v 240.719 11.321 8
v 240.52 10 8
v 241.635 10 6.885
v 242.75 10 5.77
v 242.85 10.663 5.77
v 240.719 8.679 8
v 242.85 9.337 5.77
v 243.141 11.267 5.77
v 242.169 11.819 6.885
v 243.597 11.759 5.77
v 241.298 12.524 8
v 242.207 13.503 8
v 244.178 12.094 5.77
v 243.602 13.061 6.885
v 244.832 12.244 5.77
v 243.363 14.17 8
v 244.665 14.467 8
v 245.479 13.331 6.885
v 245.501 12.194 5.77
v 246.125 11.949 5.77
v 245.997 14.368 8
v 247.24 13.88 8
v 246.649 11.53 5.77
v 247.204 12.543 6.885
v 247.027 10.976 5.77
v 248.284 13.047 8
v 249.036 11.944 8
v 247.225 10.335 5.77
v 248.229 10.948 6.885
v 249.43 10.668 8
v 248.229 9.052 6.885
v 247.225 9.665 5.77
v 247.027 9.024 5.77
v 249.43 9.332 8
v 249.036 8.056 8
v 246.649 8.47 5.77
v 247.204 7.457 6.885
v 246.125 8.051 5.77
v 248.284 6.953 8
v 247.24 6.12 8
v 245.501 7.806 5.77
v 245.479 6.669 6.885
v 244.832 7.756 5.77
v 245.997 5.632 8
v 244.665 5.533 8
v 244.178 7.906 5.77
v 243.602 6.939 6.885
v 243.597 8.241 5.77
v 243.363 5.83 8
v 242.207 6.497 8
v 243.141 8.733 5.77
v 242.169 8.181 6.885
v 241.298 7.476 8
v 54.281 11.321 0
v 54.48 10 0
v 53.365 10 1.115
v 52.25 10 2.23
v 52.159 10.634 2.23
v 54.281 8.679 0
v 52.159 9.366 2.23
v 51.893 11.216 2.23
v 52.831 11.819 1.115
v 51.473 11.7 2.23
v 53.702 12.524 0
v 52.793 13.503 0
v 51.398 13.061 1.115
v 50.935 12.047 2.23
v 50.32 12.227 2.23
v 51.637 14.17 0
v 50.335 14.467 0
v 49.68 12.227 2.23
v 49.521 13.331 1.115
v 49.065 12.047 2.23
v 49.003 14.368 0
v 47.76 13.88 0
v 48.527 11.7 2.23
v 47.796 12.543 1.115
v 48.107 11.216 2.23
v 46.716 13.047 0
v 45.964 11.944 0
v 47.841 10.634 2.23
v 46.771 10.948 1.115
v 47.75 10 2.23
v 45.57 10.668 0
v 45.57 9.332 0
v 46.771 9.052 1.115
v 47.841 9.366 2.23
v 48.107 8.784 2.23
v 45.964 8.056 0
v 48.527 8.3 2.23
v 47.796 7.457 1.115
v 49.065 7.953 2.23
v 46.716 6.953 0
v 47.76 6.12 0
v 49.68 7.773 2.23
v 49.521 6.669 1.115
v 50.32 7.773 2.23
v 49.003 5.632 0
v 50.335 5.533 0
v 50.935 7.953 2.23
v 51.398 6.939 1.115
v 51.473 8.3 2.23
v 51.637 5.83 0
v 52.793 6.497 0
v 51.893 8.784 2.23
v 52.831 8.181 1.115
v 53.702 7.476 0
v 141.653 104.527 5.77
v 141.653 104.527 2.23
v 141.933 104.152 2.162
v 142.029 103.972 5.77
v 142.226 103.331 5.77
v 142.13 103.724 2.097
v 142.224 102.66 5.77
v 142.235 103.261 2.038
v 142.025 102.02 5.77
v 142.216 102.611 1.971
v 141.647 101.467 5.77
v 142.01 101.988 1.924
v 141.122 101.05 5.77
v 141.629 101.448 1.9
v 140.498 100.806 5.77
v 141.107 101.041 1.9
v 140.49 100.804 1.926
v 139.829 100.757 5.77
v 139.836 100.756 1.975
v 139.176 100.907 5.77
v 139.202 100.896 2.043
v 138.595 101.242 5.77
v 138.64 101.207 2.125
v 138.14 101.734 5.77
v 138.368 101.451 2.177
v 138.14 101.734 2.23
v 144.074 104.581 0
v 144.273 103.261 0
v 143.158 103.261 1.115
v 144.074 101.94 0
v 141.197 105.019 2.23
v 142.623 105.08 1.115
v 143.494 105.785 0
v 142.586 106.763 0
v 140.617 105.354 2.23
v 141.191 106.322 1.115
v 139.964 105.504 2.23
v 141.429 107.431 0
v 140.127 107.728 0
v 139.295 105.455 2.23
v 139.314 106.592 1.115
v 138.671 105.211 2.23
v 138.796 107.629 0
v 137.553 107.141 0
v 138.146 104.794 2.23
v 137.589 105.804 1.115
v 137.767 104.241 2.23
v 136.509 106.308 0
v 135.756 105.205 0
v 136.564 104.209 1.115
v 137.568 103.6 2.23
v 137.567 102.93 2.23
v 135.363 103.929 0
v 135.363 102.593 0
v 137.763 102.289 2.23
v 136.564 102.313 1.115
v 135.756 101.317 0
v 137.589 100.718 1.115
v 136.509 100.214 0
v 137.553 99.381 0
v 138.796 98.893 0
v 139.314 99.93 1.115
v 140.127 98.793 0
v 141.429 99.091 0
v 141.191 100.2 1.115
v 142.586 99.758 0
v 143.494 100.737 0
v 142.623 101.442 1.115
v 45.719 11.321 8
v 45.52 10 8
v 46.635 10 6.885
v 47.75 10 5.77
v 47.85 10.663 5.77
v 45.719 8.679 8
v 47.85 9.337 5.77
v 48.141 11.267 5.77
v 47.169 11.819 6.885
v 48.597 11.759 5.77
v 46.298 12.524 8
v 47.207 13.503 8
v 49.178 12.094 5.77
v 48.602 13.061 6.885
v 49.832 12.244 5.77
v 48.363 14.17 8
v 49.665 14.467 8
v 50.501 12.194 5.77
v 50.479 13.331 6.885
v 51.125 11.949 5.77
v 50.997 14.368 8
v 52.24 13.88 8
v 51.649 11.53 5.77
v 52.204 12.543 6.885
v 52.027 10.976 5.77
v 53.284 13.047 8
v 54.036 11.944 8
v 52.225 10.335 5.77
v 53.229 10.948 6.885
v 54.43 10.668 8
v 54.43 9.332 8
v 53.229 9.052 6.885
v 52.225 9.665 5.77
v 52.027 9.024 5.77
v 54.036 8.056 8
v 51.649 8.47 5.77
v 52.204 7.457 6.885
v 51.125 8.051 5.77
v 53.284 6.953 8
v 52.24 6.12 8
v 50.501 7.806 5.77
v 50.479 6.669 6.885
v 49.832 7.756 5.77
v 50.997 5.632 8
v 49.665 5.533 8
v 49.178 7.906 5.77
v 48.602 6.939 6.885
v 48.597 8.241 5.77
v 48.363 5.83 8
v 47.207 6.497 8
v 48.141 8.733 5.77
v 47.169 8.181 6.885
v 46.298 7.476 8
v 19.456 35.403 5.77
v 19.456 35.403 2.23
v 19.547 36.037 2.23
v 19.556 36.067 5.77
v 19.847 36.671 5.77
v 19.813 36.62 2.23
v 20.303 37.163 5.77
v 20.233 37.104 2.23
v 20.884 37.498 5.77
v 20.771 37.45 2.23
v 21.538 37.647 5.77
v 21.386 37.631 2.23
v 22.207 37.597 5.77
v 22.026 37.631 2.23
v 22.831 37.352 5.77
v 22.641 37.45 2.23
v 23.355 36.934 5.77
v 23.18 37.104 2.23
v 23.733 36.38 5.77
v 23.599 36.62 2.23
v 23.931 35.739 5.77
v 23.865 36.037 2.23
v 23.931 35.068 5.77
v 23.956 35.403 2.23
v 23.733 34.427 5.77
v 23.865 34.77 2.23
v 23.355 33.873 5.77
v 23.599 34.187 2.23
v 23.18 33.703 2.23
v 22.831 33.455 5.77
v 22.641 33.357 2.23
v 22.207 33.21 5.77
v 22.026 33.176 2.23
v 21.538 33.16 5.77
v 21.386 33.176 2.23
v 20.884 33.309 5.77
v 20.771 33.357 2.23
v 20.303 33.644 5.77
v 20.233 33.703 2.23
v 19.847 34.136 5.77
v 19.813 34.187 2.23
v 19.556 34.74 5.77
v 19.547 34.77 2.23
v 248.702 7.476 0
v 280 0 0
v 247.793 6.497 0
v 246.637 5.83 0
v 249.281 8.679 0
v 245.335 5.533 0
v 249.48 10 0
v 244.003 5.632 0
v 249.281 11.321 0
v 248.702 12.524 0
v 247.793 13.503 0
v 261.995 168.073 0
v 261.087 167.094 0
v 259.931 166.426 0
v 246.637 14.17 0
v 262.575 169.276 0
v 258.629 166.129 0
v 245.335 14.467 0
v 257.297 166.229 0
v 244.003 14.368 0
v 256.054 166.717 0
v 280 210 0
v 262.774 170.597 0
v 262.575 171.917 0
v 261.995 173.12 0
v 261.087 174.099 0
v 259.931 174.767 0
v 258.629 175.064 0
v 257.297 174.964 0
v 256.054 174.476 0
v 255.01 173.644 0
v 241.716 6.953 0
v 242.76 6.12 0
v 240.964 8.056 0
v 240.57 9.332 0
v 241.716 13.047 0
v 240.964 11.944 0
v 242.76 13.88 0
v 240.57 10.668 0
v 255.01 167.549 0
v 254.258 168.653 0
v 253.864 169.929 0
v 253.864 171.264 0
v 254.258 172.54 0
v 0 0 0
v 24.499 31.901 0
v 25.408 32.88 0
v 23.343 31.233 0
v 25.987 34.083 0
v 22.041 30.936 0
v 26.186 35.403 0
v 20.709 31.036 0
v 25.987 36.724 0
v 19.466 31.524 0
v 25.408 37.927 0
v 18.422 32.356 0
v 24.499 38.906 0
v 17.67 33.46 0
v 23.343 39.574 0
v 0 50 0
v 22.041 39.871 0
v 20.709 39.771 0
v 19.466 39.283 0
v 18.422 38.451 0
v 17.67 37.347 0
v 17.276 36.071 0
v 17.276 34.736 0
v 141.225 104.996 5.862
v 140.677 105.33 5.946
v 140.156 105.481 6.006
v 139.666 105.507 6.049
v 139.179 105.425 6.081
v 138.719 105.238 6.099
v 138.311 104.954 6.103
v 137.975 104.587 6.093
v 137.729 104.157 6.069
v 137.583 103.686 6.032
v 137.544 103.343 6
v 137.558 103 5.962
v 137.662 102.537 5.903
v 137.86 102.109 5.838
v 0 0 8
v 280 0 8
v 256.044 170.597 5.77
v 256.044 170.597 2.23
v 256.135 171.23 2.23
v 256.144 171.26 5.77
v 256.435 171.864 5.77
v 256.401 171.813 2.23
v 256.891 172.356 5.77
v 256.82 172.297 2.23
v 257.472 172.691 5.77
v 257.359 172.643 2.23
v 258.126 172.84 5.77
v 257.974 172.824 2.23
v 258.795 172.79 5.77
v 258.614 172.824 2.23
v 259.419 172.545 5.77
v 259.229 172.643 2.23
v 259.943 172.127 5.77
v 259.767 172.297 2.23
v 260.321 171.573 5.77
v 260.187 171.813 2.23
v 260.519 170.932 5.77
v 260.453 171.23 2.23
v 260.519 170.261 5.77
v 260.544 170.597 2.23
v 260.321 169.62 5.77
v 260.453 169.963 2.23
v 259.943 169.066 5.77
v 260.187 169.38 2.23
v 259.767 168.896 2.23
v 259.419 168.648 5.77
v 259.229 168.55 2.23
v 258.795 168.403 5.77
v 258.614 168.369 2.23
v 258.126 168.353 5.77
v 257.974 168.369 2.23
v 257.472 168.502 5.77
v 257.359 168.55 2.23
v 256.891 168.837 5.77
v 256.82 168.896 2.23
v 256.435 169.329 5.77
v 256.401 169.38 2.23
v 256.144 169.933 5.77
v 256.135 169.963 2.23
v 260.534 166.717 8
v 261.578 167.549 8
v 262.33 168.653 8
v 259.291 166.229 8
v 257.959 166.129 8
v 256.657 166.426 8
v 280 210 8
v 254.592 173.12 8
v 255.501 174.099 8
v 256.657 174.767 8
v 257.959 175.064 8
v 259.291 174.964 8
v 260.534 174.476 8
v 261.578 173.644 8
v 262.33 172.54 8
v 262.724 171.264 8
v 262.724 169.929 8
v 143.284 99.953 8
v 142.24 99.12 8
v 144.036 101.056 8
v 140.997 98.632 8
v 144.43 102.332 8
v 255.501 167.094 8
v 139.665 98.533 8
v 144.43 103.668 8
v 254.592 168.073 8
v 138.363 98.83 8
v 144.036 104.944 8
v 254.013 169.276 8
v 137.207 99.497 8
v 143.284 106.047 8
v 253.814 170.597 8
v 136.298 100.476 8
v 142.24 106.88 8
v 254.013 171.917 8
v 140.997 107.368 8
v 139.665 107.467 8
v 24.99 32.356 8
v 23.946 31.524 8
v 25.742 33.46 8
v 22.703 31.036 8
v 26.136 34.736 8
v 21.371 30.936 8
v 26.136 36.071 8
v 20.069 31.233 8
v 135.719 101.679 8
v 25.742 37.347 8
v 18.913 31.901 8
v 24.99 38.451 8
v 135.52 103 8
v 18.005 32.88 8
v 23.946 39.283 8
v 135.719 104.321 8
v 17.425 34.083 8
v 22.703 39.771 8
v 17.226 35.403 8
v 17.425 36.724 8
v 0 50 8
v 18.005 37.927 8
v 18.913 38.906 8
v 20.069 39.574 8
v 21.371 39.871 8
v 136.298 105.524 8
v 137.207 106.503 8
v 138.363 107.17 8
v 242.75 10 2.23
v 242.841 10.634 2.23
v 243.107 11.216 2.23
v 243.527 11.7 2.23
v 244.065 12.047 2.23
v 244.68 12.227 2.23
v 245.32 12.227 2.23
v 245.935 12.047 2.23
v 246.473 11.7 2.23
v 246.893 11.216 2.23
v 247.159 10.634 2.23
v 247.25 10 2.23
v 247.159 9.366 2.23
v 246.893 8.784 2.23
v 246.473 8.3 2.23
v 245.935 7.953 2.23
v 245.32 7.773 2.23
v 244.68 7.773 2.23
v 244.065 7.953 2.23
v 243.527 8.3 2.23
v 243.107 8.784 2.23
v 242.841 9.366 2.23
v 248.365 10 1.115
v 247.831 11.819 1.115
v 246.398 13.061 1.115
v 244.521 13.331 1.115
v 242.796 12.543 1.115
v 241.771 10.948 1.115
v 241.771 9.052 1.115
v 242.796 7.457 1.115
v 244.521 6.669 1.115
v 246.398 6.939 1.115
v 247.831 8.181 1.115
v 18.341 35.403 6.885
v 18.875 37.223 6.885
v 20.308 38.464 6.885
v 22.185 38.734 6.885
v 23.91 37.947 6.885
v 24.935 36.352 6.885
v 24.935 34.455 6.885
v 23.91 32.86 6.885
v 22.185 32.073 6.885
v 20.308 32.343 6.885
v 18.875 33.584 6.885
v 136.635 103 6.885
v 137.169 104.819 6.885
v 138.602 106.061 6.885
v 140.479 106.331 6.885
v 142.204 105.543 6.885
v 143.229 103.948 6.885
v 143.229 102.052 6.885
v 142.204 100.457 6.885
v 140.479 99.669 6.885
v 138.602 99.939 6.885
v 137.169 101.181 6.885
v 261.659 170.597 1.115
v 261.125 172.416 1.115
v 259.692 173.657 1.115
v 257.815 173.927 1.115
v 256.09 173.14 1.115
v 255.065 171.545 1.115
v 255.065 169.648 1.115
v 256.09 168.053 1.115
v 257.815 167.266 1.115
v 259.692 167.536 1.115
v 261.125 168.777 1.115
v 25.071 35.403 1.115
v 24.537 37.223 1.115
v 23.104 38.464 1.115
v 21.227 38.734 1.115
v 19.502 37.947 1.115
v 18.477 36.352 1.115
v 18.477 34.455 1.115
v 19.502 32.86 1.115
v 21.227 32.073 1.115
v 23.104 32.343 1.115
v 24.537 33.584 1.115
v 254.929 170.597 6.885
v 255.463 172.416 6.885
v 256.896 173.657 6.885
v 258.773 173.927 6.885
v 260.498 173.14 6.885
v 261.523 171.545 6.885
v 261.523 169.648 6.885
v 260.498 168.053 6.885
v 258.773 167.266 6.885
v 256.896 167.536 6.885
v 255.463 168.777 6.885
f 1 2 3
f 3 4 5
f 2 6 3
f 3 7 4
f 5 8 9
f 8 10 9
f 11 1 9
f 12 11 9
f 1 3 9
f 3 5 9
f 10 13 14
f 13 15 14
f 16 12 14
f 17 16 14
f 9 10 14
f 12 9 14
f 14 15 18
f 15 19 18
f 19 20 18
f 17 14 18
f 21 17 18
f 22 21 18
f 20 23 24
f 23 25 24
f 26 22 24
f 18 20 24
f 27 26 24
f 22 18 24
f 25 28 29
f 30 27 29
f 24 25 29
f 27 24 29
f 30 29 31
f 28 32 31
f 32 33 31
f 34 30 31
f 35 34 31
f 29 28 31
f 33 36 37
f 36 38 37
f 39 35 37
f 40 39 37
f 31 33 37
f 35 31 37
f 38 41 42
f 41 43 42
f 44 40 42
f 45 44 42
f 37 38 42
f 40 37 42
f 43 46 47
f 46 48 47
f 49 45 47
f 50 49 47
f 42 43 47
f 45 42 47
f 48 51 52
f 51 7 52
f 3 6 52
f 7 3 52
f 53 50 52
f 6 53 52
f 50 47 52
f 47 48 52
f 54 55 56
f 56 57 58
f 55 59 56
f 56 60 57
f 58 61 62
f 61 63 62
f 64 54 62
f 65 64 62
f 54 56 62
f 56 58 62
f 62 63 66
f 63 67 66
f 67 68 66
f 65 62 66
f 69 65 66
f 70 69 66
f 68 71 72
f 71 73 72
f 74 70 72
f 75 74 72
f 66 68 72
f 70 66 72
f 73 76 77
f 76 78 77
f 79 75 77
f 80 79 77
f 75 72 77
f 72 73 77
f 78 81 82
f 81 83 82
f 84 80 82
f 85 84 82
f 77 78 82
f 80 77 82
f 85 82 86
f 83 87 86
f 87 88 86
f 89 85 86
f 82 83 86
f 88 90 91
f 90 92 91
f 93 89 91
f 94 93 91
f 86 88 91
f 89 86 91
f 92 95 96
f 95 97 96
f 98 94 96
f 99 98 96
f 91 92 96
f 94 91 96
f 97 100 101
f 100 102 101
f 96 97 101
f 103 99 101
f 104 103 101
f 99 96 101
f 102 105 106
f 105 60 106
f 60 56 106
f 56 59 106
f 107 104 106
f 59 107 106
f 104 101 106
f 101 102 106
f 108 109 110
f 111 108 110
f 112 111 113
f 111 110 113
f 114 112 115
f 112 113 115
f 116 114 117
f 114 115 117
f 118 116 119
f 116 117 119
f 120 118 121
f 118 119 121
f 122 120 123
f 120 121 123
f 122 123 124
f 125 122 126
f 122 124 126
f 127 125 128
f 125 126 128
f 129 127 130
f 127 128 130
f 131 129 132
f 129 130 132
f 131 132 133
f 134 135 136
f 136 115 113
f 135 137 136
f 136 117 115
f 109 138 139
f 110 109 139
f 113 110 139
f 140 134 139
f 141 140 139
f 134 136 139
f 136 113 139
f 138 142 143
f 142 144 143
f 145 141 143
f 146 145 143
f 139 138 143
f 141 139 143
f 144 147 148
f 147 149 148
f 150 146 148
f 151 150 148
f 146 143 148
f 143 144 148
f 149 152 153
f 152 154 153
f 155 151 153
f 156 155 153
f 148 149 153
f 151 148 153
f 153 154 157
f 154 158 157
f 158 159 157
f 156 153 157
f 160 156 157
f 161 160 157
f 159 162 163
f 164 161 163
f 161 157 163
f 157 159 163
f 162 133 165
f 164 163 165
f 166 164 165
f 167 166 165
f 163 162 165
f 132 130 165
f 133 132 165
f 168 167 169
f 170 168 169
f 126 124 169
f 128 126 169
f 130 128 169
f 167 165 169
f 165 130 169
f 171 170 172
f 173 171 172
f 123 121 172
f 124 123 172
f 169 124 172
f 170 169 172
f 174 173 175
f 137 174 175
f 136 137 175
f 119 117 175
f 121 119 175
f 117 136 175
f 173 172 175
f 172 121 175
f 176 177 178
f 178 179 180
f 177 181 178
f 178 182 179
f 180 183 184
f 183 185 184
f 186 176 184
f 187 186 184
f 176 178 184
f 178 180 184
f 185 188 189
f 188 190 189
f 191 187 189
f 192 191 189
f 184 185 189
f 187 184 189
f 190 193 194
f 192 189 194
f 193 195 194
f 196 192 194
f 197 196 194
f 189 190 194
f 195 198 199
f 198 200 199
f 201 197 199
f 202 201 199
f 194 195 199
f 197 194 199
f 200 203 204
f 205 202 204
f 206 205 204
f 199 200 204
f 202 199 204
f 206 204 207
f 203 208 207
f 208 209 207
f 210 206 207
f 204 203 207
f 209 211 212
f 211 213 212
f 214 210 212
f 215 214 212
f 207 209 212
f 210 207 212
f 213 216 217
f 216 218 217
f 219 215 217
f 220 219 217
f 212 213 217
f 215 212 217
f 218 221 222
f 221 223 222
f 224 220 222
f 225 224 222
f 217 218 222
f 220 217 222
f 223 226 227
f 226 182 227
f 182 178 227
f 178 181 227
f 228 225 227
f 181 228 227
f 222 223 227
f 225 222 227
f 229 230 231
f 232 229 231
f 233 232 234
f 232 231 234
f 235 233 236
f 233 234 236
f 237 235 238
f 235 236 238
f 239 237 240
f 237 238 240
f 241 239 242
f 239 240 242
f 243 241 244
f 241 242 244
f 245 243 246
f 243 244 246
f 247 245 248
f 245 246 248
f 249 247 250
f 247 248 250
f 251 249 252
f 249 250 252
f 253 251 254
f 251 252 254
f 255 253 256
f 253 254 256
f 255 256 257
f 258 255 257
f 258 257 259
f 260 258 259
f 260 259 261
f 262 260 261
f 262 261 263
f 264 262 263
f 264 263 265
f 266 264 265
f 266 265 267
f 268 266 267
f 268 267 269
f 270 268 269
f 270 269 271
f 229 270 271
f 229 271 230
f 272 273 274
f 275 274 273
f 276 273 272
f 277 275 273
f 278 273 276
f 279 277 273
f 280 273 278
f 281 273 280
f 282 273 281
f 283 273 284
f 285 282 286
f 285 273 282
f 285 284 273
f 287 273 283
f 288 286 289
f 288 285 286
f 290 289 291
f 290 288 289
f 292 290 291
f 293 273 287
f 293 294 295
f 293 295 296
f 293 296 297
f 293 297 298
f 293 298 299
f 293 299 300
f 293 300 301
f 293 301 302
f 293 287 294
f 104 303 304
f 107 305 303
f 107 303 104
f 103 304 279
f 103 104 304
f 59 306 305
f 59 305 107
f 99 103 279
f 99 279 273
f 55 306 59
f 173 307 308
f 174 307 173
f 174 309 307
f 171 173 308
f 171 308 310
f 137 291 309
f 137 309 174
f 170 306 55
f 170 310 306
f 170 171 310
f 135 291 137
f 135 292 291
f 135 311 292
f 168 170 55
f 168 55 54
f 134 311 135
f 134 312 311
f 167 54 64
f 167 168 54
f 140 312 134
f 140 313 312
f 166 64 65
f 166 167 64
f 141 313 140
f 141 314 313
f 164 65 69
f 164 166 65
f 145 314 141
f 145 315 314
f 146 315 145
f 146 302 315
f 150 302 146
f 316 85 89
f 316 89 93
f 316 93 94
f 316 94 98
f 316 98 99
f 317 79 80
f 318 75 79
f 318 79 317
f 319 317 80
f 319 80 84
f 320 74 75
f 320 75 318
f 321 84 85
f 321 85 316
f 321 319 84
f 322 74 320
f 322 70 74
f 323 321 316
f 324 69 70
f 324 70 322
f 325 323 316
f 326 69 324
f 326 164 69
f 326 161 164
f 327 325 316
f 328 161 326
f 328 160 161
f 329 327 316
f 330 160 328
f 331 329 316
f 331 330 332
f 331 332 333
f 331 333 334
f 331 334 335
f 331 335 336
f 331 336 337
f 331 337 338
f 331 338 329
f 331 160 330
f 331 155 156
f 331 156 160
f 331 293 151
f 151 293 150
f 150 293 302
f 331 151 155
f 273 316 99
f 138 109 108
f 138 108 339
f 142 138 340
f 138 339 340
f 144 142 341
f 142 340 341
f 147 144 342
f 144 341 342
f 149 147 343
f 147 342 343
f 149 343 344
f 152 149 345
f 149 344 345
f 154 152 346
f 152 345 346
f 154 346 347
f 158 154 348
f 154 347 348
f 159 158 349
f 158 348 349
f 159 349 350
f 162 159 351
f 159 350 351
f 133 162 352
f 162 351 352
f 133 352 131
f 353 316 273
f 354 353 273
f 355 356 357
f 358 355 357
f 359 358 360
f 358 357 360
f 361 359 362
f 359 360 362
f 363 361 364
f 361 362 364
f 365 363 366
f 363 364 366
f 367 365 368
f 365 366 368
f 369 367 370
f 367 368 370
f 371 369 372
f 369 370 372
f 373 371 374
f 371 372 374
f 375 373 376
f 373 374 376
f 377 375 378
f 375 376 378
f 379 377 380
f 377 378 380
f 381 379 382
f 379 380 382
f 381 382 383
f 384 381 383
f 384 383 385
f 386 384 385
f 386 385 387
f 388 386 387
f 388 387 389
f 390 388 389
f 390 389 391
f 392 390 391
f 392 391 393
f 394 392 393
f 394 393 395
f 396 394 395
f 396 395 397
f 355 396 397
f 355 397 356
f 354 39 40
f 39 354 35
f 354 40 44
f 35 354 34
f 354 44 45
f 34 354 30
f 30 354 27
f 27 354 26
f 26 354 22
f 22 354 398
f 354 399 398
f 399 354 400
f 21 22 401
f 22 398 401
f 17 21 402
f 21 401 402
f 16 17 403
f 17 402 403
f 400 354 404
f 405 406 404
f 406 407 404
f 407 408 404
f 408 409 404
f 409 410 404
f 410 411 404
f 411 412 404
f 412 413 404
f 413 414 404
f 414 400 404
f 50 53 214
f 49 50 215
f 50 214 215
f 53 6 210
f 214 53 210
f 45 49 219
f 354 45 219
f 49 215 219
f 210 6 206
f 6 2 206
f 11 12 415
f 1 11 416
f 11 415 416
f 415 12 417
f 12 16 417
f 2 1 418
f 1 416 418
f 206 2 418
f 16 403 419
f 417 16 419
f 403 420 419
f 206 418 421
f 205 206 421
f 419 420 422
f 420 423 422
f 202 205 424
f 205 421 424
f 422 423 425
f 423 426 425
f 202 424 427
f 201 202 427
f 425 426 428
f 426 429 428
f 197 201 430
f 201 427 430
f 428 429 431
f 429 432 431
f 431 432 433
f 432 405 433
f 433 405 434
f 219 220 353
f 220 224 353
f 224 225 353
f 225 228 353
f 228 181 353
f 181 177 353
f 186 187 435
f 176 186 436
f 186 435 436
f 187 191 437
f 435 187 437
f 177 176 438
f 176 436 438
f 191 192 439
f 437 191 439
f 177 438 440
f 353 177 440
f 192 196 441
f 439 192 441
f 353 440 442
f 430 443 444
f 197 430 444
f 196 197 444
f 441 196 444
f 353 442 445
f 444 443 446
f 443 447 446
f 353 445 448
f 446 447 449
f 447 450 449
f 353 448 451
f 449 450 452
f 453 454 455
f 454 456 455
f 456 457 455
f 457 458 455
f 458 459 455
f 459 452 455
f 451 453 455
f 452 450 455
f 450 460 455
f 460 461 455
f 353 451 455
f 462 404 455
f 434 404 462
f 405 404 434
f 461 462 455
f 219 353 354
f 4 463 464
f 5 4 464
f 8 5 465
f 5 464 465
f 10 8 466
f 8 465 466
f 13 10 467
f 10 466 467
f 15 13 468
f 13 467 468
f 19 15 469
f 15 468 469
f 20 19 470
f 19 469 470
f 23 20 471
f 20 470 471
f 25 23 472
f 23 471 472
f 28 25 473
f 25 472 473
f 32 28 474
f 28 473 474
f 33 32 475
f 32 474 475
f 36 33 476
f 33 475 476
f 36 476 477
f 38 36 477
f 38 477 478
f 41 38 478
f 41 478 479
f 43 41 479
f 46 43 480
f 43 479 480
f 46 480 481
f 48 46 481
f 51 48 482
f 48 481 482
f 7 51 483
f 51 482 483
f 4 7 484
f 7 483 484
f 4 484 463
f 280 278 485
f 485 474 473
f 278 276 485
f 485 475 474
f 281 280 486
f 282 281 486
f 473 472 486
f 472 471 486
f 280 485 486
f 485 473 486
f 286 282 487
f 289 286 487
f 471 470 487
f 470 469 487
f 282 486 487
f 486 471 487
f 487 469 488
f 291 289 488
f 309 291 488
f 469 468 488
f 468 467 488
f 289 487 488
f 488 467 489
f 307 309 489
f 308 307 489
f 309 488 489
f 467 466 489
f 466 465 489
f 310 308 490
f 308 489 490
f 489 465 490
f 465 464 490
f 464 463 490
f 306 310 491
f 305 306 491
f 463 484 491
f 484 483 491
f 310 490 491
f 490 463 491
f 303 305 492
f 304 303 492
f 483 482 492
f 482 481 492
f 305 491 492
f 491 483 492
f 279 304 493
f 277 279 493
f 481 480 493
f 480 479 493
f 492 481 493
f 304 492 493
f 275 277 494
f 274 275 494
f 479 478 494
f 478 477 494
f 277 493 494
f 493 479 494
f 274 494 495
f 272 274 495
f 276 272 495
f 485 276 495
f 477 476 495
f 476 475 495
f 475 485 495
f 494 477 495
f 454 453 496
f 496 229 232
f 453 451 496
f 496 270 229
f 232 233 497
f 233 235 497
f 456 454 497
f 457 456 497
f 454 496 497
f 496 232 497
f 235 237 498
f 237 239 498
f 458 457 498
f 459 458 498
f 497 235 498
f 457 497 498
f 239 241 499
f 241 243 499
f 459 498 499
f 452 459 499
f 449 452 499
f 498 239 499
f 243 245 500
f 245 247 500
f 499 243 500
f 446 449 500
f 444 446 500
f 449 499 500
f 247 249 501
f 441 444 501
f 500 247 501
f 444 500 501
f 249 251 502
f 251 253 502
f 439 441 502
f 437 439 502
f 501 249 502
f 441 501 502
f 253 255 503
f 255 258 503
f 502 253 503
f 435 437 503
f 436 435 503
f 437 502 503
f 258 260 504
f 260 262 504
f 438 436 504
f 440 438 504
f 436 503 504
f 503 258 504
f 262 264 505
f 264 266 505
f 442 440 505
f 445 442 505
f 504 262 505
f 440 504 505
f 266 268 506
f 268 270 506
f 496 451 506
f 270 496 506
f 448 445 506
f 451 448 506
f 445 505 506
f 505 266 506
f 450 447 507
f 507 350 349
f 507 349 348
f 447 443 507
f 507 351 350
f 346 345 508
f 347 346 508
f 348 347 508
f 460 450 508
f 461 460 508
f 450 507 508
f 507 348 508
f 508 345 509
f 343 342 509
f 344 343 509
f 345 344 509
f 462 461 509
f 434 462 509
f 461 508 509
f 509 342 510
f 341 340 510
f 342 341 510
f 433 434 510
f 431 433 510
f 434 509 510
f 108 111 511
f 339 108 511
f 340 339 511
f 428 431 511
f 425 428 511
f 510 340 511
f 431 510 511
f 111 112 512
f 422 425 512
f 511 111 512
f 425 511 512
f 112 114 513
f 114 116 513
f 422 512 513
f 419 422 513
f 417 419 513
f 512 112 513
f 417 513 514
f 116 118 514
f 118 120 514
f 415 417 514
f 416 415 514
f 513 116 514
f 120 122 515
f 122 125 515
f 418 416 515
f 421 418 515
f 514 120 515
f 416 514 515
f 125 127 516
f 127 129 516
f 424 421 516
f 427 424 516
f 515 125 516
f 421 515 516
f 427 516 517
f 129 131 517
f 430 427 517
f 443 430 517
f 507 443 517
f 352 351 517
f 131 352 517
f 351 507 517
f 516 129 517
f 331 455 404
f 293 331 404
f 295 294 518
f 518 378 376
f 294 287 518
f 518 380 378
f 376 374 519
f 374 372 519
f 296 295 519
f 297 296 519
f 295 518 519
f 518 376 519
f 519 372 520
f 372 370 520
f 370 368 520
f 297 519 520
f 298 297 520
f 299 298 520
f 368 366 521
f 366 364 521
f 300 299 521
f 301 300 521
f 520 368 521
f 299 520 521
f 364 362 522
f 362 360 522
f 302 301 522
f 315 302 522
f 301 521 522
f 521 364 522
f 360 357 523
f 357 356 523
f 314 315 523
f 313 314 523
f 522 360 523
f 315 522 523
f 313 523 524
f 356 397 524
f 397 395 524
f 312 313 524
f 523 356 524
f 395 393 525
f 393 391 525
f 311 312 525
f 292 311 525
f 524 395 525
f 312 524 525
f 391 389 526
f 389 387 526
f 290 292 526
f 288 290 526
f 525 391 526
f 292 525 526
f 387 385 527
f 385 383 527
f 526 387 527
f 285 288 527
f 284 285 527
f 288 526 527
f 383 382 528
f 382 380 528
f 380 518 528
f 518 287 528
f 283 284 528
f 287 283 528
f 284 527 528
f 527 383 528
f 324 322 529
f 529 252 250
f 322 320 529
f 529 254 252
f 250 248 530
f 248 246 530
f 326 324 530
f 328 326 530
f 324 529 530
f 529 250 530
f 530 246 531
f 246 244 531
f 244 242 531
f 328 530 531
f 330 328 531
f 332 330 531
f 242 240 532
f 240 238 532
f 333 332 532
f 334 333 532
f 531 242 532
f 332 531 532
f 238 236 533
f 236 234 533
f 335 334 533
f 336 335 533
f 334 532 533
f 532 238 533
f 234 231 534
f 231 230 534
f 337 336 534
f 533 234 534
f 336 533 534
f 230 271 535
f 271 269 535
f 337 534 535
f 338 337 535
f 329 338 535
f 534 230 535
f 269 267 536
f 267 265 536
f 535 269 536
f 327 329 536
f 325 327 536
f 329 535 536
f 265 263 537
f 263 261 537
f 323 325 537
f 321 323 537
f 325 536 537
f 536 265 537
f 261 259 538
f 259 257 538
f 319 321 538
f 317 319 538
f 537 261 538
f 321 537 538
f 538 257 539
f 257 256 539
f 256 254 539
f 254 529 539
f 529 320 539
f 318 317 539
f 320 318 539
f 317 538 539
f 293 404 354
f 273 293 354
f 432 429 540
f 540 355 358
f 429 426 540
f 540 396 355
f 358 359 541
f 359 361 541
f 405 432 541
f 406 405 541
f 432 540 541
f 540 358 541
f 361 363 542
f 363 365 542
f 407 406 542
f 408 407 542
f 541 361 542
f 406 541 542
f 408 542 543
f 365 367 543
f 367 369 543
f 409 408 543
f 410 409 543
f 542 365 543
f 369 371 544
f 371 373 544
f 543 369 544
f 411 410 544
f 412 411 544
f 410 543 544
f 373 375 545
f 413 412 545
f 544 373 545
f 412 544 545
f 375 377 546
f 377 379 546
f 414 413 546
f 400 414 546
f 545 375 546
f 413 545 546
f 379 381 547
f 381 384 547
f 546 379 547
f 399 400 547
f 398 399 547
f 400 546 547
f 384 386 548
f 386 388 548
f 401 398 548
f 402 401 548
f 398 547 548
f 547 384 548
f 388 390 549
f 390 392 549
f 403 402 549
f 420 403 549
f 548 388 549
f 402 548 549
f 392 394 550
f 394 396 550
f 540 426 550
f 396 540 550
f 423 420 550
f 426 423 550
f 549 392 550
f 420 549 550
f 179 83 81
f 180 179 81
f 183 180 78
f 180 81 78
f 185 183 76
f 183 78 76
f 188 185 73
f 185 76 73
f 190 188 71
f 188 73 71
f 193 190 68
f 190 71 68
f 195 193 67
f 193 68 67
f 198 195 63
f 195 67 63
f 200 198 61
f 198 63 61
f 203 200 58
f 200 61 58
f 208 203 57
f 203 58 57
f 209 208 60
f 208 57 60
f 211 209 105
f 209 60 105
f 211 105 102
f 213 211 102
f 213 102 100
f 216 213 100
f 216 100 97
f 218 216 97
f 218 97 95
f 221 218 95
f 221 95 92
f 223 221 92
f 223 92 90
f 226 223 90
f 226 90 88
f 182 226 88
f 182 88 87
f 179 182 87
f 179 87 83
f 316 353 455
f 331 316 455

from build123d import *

# Parameters (mm, degrees)
RESSALTO_EXTRUS_O3_DEPTH                       = 8
ESCAREADO_PARA_SFHCS_M42_D                     = 4.5
ESCAREADO_PARA_SFHCS_M42_CSINK_D               = 8.96
ESCAREADO_PARA_SFHCS_M42_CSINK_ANGLE           = 90
RESSALTO_EXTRUS_O5_DEPTH                       = 8
ESCAREADO_PARA_SFHCS_M44_D                     = 4.5
ESCAREADO_PARA_SFHCS_M44_CSINK_D               = 8.96
ESCAREADO_PARA_SFHCS_M44_CSINK_ANGLE           = 90
ESCAREADO_PARA_SFHCS_M46_D                     = 4.5
ESCAREADO_PARA_SFHCS_M46_CSINK_D               = 8.96
ESCAREADO_PARA_SFHCS_M46_CSINK_ANGLE           = 90
ESCAREADO_PARA_SFHCS_M47_D                     = 4.5
ESCAREADO_PARA_SFHCS_M47_CSINK_D               = 8.96
ESCAREADO_PARA_SFHCS_M47_CSINK_ANGLE           = 90
ESCAREADO_PARA_SFHCS_M47_ON_FACE_2_D           = 4.5
ESCAREADO_PARA_SFHCS_M47_ON_FACE_2_CSINK_D     = 8.96
ESCAREADO_PARA_SFHCS_M47_ON_FACE_2_CSINK_ANGLE = 90


# Read off the part's stored shape, not the designer's step: Escareado para SFHCS M45
with BuildPart() as part:
    # Esboço1 → Ressalto-extrusão3 (new body)
    with BuildSketch(Plane.XY):
        Polygon((0, 20), (280, 170), (0, 0), align=None)
        Polygon((280, 0), (280, 170), (0, 0), align=None)
    extrude(amount=RESSALTO_EXTRUS_O3_DEPTH)

    # Escareado para SFHCS M42 (through all)
    with Locations(Plane(origin=(50, 10, 8), x_dir=(1, 0, 0), z_dir=(0, 0, 1))):
        with Locations((0, 0), (195, 0)):
            CounterSinkHole(ESCAREADO_PARA_SFHCS_M42_D / 2, ESCAREADO_PARA_SFHCS_M42_CSINK_D / 2, counter_sink_angle=ESCAREADO_PARA_SFHCS_M42_CSINK_ANGLE)

    # Esboço6 → Ressalto-extrusão5 (add, through all)
    with BuildSketch(Plane.XY.offset(8)):
        Polygon((0, 20), (0, 50), (280, 210), (280, 170), align=None)
    extrude(amount=-RESSALTO_EXTRUS_O5_DEPTH)

    # Escareado para SFHCS M44 (through all)
    with Locations(Plane(origin=(21.706078553, 35.403473459, 8), x_dir=(1, 0, 0), z_dir=(0, 0, 1))):
        with Locations((0, 0), (236.587842894, 135.193053082)):
            CounterSinkHole(ESCAREADO_PARA_SFHCS_M44_D / 2, ESCAREADO_PARA_SFHCS_M44_CSINK_D / 2, counter_sink_angle=ESCAREADO_PARA_SFHCS_M44_CSINK_ANGLE)

    # Escareado para SFHCS M45 outline → Escareado para SFHCS M45 (revolve, cut)
    with BuildSketch(Plane(origin=(245, 10, 0), x_dir=(1, 0, 0), z_dir=(0, -1, 0))):
        Polygon((4.48, 0), (2.25, 2.23), (2.25, 0), align=None)
    revolve(axis=Axis((245, 10, 0), (0, 0, 1)), mode=Mode.SUBTRACT)

    # Escareado para SFHCS M46 (through all)
    with Locations(Plane(origin=(258.293921447, 170.596526541, 0), x_dir=(-1, 0, 0), z_dir=(0, 0, -1))):
        with Locations((0, 0), (236.587842894, -135.193053082), (208.293921447, -160.596526541)):
            CounterSinkHole(ESCAREADO_PARA_SFHCS_M46_D / 2, ESCAREADO_PARA_SFHCS_M46_CSINK_D / 2, counter_sink_angle=ESCAREADO_PARA_SFHCS_M46_CSINK_ANGLE)

    # Escareado para SFHCS M47 (through all)
    with Locations(Plane(origin=(140, 103, 8), x_dir=(1, 0, 0), z_dir=(0, 0, 1))):
        with Locations((0, 0)):
            CounterSinkHole(ESCAREADO_PARA_SFHCS_M47_D / 2, ESCAREADO_PARA_SFHCS_M47_CSINK_D / 2, counter_sink_angle=ESCAREADO_PARA_SFHCS_M47_CSINK_ANGLE)

    # Escareado para SFHCS M47 on face 2 (through all)
    with Locations(Plane(origin=(139.792651332, 103.260866722, 0), x_dir=(-1, 0, 0), z_dir=(0, 0, -1))):
        with Locations((0, 0)):
            CounterSinkHole(ESCAREADO_PARA_SFHCS_M47_ON_FACE_2_D / 2, ESCAREADO_PARA_SFHCS_M47_ON_FACE_2_CSINK_D / 2, counter_sink_angle=ESCAREADO_PARA_SFHCS_M47_ON_FACE_2_CSINK_ANGLE)


solid = part.part
